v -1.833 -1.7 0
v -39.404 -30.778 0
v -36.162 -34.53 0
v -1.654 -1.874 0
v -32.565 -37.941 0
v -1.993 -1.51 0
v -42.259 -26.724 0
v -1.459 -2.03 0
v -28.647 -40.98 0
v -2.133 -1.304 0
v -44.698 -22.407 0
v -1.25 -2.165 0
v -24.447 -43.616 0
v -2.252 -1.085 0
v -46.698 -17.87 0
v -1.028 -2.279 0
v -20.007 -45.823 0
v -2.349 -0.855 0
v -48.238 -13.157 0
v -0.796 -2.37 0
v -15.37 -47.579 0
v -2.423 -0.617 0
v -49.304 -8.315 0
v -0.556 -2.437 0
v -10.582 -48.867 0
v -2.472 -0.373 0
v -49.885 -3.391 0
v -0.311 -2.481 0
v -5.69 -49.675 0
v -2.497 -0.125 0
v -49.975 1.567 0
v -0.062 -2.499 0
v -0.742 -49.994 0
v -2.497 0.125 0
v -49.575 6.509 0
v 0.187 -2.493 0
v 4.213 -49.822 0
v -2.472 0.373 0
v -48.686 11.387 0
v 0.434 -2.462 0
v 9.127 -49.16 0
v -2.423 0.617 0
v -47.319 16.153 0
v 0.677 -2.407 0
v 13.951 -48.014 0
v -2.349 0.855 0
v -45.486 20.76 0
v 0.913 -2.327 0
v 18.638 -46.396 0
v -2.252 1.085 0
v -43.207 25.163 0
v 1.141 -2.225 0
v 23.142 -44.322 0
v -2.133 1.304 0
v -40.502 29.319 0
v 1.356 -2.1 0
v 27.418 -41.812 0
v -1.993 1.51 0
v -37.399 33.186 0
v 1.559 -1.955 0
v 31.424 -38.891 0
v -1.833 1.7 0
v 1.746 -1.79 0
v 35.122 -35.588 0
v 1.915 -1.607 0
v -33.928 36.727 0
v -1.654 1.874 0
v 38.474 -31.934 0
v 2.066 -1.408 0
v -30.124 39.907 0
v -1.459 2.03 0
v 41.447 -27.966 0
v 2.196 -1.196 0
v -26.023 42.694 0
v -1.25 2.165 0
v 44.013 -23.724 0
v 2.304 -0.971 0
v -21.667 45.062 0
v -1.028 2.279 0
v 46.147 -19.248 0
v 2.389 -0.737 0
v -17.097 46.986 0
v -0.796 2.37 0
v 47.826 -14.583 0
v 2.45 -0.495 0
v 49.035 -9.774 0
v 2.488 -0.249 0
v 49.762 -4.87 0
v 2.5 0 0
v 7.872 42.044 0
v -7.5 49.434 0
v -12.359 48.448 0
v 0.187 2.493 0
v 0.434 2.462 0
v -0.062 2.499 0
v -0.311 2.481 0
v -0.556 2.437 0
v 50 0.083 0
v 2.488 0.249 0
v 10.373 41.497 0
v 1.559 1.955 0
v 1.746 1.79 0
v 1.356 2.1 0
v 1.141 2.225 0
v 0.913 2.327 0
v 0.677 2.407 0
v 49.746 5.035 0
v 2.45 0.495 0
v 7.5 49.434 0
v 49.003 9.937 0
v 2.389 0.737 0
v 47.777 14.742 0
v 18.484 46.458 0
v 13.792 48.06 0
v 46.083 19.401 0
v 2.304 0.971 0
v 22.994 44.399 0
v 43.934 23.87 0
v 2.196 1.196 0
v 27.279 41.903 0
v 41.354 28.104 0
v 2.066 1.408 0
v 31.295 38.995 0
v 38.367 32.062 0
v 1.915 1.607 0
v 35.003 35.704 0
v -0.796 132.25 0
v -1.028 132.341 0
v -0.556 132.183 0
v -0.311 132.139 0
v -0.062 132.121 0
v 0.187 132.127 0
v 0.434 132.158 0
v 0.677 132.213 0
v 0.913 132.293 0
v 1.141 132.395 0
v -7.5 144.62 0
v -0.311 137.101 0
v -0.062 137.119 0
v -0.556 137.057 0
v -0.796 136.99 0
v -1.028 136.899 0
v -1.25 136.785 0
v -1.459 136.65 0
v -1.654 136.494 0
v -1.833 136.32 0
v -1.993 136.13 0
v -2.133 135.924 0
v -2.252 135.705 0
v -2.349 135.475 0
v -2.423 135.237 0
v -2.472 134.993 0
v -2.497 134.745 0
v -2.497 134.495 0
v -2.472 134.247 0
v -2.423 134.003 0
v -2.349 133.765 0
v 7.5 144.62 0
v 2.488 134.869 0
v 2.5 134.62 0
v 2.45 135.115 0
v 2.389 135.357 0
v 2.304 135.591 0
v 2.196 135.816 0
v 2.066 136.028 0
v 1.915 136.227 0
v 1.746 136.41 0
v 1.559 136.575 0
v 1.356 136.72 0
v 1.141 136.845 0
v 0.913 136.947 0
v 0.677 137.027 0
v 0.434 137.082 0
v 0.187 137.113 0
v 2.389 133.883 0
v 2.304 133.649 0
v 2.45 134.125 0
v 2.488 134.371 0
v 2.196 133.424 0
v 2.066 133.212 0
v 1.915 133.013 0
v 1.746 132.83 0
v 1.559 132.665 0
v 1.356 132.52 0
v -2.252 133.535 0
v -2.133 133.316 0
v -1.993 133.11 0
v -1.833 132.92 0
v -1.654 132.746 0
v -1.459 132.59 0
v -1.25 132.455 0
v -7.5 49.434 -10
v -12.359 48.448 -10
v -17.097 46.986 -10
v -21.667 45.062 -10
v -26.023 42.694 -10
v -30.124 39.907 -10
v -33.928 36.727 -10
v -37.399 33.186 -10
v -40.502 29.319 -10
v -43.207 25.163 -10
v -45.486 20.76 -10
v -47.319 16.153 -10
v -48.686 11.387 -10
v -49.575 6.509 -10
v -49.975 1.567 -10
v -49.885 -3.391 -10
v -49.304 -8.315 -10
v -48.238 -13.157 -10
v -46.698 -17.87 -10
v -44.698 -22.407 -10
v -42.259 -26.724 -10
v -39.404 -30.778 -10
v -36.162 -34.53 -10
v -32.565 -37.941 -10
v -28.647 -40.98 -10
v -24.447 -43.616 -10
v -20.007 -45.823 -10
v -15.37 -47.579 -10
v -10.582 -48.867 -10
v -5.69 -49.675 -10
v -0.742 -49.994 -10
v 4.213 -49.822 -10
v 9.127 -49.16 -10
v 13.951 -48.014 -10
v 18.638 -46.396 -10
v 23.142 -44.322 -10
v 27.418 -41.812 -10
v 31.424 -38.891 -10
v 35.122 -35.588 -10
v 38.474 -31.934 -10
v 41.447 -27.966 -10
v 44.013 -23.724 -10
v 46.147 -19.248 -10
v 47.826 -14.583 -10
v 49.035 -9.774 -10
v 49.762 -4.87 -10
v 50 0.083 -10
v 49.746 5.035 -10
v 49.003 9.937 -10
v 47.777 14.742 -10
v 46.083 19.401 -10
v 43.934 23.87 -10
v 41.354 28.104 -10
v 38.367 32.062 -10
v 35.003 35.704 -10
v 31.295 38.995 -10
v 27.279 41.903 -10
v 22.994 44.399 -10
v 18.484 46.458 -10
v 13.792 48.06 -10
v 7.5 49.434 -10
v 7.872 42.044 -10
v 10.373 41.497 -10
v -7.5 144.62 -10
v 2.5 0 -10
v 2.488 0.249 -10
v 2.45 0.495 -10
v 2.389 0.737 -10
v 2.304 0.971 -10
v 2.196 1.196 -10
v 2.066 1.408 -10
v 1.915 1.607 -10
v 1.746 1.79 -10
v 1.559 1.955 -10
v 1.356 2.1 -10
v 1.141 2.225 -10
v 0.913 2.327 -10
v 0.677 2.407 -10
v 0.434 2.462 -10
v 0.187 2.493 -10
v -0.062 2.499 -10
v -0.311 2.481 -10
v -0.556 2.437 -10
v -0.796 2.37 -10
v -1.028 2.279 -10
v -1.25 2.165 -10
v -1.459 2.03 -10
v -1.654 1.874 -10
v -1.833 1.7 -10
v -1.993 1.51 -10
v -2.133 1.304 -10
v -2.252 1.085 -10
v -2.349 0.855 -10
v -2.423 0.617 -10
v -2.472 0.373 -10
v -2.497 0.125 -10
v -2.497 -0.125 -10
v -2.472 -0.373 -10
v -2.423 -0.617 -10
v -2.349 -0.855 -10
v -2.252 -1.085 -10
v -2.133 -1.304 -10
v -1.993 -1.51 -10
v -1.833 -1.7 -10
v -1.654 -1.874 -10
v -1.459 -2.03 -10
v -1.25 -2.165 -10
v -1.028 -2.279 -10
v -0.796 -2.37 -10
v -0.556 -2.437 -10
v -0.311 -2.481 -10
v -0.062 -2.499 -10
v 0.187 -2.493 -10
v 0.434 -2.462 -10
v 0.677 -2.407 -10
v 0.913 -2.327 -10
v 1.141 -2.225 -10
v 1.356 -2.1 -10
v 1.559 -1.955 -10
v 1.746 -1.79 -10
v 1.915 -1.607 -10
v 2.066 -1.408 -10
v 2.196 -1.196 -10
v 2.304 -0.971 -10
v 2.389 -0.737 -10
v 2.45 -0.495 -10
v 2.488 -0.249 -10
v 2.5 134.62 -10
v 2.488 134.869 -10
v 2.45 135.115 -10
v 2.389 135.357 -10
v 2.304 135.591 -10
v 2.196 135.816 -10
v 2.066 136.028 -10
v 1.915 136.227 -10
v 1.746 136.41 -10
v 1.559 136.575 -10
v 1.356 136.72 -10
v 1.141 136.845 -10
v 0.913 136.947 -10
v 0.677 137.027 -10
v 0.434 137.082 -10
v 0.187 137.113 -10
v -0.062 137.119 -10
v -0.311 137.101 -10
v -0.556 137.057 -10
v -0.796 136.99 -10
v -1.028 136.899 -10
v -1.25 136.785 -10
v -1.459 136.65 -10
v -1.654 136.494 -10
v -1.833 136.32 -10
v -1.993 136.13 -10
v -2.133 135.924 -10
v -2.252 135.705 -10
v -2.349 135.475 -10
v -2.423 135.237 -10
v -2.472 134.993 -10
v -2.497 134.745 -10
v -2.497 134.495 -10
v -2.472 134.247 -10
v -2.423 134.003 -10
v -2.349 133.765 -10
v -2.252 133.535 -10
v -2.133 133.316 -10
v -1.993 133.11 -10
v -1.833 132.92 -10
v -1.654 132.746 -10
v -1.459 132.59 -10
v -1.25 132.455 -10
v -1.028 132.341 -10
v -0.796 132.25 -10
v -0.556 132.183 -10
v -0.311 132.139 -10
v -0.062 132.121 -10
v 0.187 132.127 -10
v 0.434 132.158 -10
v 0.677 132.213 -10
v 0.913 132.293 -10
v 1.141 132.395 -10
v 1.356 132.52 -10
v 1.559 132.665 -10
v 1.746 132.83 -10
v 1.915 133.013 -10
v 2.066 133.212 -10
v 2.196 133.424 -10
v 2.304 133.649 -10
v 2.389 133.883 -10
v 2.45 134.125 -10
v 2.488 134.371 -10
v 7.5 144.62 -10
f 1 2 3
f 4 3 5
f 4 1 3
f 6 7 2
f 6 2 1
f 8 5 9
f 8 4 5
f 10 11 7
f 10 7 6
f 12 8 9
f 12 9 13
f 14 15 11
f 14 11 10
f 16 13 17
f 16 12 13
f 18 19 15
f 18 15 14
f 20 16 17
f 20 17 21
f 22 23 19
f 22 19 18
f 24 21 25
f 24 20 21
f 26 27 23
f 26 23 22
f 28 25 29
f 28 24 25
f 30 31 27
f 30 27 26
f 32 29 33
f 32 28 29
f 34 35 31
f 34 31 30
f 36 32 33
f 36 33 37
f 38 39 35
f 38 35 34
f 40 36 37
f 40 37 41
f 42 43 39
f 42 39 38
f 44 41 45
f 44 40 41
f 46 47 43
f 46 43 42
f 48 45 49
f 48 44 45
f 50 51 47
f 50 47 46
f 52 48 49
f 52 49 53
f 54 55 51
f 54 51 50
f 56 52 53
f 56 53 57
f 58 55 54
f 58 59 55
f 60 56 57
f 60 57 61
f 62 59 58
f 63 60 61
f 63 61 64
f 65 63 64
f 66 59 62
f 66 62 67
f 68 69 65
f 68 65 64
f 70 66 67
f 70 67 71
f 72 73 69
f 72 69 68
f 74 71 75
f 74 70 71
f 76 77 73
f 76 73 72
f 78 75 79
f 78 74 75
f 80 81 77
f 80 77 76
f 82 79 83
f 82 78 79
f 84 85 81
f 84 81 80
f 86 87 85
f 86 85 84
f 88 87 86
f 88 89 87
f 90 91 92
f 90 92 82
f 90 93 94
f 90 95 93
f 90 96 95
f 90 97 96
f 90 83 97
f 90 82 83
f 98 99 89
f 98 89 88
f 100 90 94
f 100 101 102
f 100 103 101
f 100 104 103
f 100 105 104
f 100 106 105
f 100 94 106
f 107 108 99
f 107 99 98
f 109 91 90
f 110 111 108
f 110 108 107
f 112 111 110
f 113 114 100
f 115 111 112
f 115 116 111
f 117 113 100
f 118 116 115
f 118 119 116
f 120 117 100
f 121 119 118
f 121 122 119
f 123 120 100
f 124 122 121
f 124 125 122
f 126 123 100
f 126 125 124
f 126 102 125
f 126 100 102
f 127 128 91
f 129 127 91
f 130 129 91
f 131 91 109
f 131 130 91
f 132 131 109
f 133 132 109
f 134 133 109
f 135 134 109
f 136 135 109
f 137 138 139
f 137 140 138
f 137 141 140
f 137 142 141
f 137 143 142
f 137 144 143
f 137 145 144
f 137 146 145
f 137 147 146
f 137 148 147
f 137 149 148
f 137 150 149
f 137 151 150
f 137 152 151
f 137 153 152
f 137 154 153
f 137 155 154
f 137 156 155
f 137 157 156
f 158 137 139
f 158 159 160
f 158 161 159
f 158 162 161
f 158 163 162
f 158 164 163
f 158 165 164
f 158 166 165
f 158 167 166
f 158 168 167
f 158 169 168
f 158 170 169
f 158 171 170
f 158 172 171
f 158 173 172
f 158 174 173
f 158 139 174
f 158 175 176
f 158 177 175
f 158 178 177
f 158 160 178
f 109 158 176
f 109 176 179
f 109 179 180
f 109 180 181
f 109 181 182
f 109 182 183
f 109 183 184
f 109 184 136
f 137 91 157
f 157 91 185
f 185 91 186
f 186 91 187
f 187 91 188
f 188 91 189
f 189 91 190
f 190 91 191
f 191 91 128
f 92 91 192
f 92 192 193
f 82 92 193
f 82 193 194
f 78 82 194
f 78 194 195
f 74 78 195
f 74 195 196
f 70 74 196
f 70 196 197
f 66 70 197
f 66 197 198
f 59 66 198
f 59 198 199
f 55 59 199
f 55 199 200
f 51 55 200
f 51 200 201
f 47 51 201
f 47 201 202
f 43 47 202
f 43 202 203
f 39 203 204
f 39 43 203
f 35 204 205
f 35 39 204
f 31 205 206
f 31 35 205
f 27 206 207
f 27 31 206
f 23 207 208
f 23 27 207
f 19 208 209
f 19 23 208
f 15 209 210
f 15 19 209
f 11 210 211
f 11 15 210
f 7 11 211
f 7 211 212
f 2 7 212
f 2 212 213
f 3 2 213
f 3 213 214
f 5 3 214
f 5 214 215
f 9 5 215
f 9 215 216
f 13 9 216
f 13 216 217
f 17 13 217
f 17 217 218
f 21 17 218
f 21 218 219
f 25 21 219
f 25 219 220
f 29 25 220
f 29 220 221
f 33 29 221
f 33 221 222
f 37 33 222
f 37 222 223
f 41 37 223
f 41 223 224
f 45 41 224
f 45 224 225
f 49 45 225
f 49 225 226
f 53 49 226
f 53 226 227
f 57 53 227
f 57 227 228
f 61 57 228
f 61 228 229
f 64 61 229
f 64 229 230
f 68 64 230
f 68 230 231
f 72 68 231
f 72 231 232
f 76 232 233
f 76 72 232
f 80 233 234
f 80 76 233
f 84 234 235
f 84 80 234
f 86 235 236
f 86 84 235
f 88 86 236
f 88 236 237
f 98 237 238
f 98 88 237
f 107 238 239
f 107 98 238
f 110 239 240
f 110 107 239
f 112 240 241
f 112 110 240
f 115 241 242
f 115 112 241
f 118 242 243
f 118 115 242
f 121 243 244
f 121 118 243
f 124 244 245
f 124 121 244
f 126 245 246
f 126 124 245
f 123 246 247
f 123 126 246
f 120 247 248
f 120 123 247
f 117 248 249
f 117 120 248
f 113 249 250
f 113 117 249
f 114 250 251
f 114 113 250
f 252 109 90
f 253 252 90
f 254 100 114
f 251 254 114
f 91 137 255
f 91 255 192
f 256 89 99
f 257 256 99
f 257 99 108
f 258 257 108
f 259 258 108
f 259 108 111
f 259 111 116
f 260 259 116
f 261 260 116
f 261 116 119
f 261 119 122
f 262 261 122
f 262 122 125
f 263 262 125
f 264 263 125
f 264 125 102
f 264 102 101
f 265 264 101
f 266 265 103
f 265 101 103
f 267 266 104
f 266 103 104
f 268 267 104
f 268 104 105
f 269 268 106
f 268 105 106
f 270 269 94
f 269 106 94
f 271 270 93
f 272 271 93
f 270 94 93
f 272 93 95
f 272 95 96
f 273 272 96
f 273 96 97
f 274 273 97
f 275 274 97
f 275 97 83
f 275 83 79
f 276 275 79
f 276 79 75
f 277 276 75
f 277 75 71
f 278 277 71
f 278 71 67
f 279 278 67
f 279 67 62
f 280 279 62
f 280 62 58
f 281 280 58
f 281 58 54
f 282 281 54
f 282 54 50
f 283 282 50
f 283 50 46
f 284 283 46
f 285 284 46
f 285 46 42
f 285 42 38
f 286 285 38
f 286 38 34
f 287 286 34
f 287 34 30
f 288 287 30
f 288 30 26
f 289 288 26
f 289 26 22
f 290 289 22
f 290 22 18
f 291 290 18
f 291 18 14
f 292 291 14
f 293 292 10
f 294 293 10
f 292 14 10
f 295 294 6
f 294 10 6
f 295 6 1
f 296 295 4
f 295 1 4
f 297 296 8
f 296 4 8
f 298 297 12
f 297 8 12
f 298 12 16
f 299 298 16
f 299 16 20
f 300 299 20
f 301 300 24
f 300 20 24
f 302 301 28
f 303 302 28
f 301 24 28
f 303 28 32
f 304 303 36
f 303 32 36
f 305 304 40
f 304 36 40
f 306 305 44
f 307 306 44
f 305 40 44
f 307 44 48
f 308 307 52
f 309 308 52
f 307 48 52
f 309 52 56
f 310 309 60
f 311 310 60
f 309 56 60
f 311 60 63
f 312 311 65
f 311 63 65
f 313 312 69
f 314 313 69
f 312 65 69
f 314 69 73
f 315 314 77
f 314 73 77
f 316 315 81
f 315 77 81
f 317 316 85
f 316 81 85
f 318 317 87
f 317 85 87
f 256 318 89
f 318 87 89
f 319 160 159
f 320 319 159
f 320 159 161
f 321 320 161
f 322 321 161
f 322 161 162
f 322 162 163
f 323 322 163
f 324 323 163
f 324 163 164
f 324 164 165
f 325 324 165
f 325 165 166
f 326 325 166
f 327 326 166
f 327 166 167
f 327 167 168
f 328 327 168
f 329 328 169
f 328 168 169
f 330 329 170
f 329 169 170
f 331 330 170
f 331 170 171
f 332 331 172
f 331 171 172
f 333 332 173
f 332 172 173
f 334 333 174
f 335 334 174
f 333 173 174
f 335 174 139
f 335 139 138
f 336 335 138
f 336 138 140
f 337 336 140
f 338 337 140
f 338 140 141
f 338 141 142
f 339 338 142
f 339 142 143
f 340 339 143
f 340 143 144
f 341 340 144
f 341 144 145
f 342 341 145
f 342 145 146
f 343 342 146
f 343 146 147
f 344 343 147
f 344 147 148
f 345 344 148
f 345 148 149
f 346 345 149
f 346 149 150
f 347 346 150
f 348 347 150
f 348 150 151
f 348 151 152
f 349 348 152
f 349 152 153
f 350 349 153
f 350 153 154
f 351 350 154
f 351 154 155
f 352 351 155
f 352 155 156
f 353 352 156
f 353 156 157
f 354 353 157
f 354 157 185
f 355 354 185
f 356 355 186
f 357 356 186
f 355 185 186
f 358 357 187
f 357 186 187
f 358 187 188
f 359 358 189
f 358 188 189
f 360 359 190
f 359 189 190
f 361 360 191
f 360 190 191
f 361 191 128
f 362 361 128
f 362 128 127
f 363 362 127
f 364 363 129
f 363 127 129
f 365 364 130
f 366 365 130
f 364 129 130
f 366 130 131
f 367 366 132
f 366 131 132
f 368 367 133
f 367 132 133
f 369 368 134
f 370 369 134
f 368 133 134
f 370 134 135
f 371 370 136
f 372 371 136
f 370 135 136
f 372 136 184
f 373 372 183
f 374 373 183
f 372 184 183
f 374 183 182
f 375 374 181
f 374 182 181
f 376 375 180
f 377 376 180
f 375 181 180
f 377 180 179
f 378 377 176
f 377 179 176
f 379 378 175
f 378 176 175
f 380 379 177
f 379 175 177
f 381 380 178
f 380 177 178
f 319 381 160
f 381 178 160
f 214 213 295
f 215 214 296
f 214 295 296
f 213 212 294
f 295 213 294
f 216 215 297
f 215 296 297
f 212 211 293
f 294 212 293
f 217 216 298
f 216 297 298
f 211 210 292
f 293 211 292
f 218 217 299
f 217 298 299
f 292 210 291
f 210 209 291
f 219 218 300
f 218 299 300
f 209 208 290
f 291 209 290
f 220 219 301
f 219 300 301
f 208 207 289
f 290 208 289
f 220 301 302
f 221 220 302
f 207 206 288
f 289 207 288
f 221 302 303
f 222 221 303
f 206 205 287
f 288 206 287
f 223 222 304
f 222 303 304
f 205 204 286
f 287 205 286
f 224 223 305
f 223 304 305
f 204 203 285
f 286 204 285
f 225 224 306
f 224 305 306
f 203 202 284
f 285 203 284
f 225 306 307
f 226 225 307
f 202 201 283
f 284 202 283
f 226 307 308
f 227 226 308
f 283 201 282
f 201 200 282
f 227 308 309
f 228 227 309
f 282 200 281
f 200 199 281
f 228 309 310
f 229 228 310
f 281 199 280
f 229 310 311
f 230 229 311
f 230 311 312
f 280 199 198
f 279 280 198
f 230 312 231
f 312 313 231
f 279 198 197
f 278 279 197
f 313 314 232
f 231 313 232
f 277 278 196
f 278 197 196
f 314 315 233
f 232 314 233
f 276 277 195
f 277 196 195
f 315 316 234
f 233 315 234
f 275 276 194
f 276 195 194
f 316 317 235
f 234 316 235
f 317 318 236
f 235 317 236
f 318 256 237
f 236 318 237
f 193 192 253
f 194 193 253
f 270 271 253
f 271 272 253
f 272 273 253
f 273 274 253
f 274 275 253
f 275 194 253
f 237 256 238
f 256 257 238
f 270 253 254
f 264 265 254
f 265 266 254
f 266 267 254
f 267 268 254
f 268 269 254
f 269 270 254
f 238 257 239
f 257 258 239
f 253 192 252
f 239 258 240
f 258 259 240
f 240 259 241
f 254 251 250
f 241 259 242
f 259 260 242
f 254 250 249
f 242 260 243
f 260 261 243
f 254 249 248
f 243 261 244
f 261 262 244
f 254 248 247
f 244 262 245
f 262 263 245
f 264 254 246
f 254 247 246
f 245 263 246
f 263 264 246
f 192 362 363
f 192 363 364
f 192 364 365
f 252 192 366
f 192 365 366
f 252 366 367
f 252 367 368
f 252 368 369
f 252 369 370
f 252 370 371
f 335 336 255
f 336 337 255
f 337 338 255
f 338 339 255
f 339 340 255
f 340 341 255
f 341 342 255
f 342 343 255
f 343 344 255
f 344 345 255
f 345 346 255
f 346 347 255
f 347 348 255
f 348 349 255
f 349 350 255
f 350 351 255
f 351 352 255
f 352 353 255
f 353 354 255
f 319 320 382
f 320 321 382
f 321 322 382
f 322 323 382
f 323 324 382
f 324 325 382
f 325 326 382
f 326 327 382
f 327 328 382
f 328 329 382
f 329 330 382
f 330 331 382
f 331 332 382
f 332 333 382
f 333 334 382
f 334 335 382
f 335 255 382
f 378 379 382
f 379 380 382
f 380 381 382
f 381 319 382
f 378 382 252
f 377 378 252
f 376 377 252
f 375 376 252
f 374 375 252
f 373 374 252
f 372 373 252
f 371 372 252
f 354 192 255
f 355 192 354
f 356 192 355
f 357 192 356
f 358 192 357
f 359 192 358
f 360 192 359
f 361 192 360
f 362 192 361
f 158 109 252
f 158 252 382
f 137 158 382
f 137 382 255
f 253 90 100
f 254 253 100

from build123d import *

# Parameters (mm, degrees)
BASE_FLANGE1_DEPTH = 10
CUT_EXTRUDE1_REACH = 155.346
SKETCH7_R          = 2.5
CUT_EXTRUDE2_REACH = 155.346


# Sheet-metal steps are written as plain solids
with BuildPart() as part:
    # Sketch2 → Base-Flange1 (new body)
    with BuildSketch(Plane.XY):
        with BuildLine():
            Line((7.5, 49.434299833), (7.5, 144.62))
            Line((7.5, 144.62), (-7.5, 144.62))
            Line((-7.5, 144.62), (-7.5, 49.434299833))
            ThreePointArc((-7.5, 49.434299833), (0, -50), (7.5, 49.434299833))
        make_face()
    extrude(amount=-BASE_FLANGE1_DEPTH)

    # Sketch7 → Cut-Extrude1 (cut, up to next)
    with BuildSketch(Plane.XY, mode=Mode.PRIVATE) as cut_extrude1_sk1:
        with Locations((0, 134.62)):
            Circle(SKETCH7_R)
    cut_extrude1_tool1 = extrude(cut_extrude1_sk1.sketch, amount=-CUT_EXTRUDE1_REACH, mode=Mode.PRIVATE) & part.part
    # Sketch7 → Cut-Extrude1 (cut, up to next)
    with BuildSketch(Plane.XY, mode=Mode.PRIVATE) as cut_extrude1_sk2:
        Circle(SKETCH7_R)
    cut_extrude1_tool2 = extrude(cut_extrude1_sk2.sketch, amount=-CUT_EXTRUDE1_REACH, mode=Mode.PRIVATE) & part.part
    add(cut_extrude1_tool1.solids().sort_by_distance((0, 134.62, 0))[0], mode=Mode.SUBTRACT)
    add(cut_extrude1_tool2.solids().sort_by_distance((0, 0, 0))[0], mode=Mode.SUBTRACT)

    # Sketch8 → Cut-Extrude2 (cut, up to next)
    with BuildSketch(Plane.XY, mode=Mode.PRIVATE) as cut_extrude2_sk1:
        with BuildLine():
            Line((7.5, 49.434299833), (7.871687465, 42.043640294))
            Line((7.871687465, 42.043640294), (10.372740004, 41.497438686))
            Line((10.372740004, 41.497438686), (13.791710294, 48.060261414))
            ThreePointArc((13.791710294, 48.060261414), (10.66800015, 48.848682406), (7.5, 49.434299833))
        make_face()
    cut_extrude2_tool1 = extrude(cut_extrude2_sk1.sketch, amount=-CUT_EXTRUDE2_REACH, mode=Mode.PRIVATE) & part.part
    add(cut_extrude2_tool1.solids().sort_by_distance((10.002556, 45.80162, 0))[0], mode=Mode.SUBTRACT)


solid = part.part
